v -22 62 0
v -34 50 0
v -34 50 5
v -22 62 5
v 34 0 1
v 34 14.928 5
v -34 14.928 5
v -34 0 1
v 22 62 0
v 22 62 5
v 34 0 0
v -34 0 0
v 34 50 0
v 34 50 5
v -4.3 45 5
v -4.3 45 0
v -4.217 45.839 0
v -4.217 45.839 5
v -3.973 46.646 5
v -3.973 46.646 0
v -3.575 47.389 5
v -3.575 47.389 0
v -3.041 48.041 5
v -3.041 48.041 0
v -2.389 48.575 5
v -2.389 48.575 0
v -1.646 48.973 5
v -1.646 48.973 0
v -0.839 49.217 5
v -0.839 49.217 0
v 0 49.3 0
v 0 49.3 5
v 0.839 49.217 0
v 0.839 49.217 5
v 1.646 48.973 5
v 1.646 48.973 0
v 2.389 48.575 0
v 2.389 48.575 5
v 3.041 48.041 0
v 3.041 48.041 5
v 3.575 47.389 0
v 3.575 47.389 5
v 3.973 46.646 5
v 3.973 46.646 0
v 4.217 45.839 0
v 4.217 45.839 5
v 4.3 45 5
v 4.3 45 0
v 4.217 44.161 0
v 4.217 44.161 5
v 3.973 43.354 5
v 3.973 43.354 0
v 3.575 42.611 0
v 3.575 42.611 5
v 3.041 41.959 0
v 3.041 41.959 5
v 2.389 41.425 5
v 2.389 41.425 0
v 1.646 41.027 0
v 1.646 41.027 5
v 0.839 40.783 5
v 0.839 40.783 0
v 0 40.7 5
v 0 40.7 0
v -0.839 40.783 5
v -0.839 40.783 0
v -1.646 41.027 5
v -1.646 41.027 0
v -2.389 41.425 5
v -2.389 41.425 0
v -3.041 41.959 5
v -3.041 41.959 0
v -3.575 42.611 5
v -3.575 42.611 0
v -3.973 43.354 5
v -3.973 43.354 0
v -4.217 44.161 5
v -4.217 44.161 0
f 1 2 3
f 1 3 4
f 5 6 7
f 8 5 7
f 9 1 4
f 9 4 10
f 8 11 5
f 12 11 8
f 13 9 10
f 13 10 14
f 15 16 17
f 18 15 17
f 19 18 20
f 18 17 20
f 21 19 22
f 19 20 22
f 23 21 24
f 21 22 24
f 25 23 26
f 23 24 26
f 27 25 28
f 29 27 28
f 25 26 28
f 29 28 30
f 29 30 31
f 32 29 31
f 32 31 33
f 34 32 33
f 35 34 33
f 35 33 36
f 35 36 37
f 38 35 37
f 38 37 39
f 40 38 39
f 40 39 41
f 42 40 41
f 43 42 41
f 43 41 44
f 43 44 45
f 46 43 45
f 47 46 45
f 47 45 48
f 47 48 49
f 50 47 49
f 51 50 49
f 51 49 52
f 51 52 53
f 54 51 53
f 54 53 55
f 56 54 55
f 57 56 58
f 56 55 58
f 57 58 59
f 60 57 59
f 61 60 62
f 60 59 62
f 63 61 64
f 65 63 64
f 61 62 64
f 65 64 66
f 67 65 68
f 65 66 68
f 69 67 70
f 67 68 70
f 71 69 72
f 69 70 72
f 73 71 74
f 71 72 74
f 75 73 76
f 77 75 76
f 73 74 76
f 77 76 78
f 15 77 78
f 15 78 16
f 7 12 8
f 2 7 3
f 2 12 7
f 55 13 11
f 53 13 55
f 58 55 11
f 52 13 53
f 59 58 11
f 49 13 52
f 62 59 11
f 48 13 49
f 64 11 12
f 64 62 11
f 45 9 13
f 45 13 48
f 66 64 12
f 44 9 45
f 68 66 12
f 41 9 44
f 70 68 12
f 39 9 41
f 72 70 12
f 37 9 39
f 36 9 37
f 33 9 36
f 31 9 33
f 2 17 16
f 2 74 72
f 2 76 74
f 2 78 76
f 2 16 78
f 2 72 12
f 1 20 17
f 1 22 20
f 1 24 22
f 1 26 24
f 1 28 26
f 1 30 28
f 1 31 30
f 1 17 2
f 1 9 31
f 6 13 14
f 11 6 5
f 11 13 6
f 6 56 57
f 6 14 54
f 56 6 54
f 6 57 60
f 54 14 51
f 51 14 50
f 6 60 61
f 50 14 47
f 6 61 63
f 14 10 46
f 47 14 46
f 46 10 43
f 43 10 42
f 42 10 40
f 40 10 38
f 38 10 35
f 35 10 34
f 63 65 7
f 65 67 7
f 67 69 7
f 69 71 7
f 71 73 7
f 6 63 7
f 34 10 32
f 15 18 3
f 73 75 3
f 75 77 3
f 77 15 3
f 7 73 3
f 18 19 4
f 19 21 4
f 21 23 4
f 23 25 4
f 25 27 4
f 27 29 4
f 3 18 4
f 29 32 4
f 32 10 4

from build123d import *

# Parameters (mm, degrees)
AUFSATZ_LINEAR_AUSTRAGEN1_DEPTH      = 5
F_8_6_8_6_DURCHMESSER_BOHRUNG1_D     = 8.6
F_8_6_8_6_DURCHMESSER_BOHRUNG1_DEPTH = 80
F_8_6_8_6_DURCHMESSER_BOHRUNG1_TIP   = 2.583700662
FASE1_SIZE                           = 4
FASE1_SIZE2                          = 14.92820323


with BuildPart() as part:
    # Skizze1 → Aufsatz-Linear austragen1 (new body)
    with BuildSketch(Plane.XY):
        Polygon((-34, 50), (-22, 62), (22, 62), (34, 50), (34, 0), (-34, 0), align=None)
    extrude(amount=AUFSATZ_LINEAR_AUSTRAGEN1_DEPTH)

    # Ø8.6 (8.6) Durchmesser Bohrung1
    with Locations(Plane.XY.offset(5)):
        with Locations((0, 45)):
            Hole(F_8_6_8_6_DURCHMESSER_BOHRUNG1_D / 2, depth=F_8_6_8_6_DURCHMESSER_BOHRUNG1_DEPTH)
            with Locations((0, 0, -(F_8_6_8_6_DURCHMESSER_BOHRUNG1_DEPTH + F_8_6_8_6_DURCHMESSER_BOHRUNG1_TIP / 2))):  # 118° drill point
                Cone(0, F_8_6_8_6_DURCHMESSER_BOHRUNG1_D / 2, F_8_6_8_6_DURCHMESSER_BOHRUNG1_TIP, mode=Mode.SUBTRACT)

    # Fase1
    fase1_edges = [part.edges().sort_by_distance(p)[0] for p in [
        (0, 0, 5),
    ]]
    fase1_side = [part.faces().sort_by_distance(p)[0] for p in [
        (0, 0, 2.5),
    ]]
    chamfer(fase1_edges, length=FASE1_SIZE, length2=FASE1_SIZE2, reference=fase1_side[0])


solid = part.part
